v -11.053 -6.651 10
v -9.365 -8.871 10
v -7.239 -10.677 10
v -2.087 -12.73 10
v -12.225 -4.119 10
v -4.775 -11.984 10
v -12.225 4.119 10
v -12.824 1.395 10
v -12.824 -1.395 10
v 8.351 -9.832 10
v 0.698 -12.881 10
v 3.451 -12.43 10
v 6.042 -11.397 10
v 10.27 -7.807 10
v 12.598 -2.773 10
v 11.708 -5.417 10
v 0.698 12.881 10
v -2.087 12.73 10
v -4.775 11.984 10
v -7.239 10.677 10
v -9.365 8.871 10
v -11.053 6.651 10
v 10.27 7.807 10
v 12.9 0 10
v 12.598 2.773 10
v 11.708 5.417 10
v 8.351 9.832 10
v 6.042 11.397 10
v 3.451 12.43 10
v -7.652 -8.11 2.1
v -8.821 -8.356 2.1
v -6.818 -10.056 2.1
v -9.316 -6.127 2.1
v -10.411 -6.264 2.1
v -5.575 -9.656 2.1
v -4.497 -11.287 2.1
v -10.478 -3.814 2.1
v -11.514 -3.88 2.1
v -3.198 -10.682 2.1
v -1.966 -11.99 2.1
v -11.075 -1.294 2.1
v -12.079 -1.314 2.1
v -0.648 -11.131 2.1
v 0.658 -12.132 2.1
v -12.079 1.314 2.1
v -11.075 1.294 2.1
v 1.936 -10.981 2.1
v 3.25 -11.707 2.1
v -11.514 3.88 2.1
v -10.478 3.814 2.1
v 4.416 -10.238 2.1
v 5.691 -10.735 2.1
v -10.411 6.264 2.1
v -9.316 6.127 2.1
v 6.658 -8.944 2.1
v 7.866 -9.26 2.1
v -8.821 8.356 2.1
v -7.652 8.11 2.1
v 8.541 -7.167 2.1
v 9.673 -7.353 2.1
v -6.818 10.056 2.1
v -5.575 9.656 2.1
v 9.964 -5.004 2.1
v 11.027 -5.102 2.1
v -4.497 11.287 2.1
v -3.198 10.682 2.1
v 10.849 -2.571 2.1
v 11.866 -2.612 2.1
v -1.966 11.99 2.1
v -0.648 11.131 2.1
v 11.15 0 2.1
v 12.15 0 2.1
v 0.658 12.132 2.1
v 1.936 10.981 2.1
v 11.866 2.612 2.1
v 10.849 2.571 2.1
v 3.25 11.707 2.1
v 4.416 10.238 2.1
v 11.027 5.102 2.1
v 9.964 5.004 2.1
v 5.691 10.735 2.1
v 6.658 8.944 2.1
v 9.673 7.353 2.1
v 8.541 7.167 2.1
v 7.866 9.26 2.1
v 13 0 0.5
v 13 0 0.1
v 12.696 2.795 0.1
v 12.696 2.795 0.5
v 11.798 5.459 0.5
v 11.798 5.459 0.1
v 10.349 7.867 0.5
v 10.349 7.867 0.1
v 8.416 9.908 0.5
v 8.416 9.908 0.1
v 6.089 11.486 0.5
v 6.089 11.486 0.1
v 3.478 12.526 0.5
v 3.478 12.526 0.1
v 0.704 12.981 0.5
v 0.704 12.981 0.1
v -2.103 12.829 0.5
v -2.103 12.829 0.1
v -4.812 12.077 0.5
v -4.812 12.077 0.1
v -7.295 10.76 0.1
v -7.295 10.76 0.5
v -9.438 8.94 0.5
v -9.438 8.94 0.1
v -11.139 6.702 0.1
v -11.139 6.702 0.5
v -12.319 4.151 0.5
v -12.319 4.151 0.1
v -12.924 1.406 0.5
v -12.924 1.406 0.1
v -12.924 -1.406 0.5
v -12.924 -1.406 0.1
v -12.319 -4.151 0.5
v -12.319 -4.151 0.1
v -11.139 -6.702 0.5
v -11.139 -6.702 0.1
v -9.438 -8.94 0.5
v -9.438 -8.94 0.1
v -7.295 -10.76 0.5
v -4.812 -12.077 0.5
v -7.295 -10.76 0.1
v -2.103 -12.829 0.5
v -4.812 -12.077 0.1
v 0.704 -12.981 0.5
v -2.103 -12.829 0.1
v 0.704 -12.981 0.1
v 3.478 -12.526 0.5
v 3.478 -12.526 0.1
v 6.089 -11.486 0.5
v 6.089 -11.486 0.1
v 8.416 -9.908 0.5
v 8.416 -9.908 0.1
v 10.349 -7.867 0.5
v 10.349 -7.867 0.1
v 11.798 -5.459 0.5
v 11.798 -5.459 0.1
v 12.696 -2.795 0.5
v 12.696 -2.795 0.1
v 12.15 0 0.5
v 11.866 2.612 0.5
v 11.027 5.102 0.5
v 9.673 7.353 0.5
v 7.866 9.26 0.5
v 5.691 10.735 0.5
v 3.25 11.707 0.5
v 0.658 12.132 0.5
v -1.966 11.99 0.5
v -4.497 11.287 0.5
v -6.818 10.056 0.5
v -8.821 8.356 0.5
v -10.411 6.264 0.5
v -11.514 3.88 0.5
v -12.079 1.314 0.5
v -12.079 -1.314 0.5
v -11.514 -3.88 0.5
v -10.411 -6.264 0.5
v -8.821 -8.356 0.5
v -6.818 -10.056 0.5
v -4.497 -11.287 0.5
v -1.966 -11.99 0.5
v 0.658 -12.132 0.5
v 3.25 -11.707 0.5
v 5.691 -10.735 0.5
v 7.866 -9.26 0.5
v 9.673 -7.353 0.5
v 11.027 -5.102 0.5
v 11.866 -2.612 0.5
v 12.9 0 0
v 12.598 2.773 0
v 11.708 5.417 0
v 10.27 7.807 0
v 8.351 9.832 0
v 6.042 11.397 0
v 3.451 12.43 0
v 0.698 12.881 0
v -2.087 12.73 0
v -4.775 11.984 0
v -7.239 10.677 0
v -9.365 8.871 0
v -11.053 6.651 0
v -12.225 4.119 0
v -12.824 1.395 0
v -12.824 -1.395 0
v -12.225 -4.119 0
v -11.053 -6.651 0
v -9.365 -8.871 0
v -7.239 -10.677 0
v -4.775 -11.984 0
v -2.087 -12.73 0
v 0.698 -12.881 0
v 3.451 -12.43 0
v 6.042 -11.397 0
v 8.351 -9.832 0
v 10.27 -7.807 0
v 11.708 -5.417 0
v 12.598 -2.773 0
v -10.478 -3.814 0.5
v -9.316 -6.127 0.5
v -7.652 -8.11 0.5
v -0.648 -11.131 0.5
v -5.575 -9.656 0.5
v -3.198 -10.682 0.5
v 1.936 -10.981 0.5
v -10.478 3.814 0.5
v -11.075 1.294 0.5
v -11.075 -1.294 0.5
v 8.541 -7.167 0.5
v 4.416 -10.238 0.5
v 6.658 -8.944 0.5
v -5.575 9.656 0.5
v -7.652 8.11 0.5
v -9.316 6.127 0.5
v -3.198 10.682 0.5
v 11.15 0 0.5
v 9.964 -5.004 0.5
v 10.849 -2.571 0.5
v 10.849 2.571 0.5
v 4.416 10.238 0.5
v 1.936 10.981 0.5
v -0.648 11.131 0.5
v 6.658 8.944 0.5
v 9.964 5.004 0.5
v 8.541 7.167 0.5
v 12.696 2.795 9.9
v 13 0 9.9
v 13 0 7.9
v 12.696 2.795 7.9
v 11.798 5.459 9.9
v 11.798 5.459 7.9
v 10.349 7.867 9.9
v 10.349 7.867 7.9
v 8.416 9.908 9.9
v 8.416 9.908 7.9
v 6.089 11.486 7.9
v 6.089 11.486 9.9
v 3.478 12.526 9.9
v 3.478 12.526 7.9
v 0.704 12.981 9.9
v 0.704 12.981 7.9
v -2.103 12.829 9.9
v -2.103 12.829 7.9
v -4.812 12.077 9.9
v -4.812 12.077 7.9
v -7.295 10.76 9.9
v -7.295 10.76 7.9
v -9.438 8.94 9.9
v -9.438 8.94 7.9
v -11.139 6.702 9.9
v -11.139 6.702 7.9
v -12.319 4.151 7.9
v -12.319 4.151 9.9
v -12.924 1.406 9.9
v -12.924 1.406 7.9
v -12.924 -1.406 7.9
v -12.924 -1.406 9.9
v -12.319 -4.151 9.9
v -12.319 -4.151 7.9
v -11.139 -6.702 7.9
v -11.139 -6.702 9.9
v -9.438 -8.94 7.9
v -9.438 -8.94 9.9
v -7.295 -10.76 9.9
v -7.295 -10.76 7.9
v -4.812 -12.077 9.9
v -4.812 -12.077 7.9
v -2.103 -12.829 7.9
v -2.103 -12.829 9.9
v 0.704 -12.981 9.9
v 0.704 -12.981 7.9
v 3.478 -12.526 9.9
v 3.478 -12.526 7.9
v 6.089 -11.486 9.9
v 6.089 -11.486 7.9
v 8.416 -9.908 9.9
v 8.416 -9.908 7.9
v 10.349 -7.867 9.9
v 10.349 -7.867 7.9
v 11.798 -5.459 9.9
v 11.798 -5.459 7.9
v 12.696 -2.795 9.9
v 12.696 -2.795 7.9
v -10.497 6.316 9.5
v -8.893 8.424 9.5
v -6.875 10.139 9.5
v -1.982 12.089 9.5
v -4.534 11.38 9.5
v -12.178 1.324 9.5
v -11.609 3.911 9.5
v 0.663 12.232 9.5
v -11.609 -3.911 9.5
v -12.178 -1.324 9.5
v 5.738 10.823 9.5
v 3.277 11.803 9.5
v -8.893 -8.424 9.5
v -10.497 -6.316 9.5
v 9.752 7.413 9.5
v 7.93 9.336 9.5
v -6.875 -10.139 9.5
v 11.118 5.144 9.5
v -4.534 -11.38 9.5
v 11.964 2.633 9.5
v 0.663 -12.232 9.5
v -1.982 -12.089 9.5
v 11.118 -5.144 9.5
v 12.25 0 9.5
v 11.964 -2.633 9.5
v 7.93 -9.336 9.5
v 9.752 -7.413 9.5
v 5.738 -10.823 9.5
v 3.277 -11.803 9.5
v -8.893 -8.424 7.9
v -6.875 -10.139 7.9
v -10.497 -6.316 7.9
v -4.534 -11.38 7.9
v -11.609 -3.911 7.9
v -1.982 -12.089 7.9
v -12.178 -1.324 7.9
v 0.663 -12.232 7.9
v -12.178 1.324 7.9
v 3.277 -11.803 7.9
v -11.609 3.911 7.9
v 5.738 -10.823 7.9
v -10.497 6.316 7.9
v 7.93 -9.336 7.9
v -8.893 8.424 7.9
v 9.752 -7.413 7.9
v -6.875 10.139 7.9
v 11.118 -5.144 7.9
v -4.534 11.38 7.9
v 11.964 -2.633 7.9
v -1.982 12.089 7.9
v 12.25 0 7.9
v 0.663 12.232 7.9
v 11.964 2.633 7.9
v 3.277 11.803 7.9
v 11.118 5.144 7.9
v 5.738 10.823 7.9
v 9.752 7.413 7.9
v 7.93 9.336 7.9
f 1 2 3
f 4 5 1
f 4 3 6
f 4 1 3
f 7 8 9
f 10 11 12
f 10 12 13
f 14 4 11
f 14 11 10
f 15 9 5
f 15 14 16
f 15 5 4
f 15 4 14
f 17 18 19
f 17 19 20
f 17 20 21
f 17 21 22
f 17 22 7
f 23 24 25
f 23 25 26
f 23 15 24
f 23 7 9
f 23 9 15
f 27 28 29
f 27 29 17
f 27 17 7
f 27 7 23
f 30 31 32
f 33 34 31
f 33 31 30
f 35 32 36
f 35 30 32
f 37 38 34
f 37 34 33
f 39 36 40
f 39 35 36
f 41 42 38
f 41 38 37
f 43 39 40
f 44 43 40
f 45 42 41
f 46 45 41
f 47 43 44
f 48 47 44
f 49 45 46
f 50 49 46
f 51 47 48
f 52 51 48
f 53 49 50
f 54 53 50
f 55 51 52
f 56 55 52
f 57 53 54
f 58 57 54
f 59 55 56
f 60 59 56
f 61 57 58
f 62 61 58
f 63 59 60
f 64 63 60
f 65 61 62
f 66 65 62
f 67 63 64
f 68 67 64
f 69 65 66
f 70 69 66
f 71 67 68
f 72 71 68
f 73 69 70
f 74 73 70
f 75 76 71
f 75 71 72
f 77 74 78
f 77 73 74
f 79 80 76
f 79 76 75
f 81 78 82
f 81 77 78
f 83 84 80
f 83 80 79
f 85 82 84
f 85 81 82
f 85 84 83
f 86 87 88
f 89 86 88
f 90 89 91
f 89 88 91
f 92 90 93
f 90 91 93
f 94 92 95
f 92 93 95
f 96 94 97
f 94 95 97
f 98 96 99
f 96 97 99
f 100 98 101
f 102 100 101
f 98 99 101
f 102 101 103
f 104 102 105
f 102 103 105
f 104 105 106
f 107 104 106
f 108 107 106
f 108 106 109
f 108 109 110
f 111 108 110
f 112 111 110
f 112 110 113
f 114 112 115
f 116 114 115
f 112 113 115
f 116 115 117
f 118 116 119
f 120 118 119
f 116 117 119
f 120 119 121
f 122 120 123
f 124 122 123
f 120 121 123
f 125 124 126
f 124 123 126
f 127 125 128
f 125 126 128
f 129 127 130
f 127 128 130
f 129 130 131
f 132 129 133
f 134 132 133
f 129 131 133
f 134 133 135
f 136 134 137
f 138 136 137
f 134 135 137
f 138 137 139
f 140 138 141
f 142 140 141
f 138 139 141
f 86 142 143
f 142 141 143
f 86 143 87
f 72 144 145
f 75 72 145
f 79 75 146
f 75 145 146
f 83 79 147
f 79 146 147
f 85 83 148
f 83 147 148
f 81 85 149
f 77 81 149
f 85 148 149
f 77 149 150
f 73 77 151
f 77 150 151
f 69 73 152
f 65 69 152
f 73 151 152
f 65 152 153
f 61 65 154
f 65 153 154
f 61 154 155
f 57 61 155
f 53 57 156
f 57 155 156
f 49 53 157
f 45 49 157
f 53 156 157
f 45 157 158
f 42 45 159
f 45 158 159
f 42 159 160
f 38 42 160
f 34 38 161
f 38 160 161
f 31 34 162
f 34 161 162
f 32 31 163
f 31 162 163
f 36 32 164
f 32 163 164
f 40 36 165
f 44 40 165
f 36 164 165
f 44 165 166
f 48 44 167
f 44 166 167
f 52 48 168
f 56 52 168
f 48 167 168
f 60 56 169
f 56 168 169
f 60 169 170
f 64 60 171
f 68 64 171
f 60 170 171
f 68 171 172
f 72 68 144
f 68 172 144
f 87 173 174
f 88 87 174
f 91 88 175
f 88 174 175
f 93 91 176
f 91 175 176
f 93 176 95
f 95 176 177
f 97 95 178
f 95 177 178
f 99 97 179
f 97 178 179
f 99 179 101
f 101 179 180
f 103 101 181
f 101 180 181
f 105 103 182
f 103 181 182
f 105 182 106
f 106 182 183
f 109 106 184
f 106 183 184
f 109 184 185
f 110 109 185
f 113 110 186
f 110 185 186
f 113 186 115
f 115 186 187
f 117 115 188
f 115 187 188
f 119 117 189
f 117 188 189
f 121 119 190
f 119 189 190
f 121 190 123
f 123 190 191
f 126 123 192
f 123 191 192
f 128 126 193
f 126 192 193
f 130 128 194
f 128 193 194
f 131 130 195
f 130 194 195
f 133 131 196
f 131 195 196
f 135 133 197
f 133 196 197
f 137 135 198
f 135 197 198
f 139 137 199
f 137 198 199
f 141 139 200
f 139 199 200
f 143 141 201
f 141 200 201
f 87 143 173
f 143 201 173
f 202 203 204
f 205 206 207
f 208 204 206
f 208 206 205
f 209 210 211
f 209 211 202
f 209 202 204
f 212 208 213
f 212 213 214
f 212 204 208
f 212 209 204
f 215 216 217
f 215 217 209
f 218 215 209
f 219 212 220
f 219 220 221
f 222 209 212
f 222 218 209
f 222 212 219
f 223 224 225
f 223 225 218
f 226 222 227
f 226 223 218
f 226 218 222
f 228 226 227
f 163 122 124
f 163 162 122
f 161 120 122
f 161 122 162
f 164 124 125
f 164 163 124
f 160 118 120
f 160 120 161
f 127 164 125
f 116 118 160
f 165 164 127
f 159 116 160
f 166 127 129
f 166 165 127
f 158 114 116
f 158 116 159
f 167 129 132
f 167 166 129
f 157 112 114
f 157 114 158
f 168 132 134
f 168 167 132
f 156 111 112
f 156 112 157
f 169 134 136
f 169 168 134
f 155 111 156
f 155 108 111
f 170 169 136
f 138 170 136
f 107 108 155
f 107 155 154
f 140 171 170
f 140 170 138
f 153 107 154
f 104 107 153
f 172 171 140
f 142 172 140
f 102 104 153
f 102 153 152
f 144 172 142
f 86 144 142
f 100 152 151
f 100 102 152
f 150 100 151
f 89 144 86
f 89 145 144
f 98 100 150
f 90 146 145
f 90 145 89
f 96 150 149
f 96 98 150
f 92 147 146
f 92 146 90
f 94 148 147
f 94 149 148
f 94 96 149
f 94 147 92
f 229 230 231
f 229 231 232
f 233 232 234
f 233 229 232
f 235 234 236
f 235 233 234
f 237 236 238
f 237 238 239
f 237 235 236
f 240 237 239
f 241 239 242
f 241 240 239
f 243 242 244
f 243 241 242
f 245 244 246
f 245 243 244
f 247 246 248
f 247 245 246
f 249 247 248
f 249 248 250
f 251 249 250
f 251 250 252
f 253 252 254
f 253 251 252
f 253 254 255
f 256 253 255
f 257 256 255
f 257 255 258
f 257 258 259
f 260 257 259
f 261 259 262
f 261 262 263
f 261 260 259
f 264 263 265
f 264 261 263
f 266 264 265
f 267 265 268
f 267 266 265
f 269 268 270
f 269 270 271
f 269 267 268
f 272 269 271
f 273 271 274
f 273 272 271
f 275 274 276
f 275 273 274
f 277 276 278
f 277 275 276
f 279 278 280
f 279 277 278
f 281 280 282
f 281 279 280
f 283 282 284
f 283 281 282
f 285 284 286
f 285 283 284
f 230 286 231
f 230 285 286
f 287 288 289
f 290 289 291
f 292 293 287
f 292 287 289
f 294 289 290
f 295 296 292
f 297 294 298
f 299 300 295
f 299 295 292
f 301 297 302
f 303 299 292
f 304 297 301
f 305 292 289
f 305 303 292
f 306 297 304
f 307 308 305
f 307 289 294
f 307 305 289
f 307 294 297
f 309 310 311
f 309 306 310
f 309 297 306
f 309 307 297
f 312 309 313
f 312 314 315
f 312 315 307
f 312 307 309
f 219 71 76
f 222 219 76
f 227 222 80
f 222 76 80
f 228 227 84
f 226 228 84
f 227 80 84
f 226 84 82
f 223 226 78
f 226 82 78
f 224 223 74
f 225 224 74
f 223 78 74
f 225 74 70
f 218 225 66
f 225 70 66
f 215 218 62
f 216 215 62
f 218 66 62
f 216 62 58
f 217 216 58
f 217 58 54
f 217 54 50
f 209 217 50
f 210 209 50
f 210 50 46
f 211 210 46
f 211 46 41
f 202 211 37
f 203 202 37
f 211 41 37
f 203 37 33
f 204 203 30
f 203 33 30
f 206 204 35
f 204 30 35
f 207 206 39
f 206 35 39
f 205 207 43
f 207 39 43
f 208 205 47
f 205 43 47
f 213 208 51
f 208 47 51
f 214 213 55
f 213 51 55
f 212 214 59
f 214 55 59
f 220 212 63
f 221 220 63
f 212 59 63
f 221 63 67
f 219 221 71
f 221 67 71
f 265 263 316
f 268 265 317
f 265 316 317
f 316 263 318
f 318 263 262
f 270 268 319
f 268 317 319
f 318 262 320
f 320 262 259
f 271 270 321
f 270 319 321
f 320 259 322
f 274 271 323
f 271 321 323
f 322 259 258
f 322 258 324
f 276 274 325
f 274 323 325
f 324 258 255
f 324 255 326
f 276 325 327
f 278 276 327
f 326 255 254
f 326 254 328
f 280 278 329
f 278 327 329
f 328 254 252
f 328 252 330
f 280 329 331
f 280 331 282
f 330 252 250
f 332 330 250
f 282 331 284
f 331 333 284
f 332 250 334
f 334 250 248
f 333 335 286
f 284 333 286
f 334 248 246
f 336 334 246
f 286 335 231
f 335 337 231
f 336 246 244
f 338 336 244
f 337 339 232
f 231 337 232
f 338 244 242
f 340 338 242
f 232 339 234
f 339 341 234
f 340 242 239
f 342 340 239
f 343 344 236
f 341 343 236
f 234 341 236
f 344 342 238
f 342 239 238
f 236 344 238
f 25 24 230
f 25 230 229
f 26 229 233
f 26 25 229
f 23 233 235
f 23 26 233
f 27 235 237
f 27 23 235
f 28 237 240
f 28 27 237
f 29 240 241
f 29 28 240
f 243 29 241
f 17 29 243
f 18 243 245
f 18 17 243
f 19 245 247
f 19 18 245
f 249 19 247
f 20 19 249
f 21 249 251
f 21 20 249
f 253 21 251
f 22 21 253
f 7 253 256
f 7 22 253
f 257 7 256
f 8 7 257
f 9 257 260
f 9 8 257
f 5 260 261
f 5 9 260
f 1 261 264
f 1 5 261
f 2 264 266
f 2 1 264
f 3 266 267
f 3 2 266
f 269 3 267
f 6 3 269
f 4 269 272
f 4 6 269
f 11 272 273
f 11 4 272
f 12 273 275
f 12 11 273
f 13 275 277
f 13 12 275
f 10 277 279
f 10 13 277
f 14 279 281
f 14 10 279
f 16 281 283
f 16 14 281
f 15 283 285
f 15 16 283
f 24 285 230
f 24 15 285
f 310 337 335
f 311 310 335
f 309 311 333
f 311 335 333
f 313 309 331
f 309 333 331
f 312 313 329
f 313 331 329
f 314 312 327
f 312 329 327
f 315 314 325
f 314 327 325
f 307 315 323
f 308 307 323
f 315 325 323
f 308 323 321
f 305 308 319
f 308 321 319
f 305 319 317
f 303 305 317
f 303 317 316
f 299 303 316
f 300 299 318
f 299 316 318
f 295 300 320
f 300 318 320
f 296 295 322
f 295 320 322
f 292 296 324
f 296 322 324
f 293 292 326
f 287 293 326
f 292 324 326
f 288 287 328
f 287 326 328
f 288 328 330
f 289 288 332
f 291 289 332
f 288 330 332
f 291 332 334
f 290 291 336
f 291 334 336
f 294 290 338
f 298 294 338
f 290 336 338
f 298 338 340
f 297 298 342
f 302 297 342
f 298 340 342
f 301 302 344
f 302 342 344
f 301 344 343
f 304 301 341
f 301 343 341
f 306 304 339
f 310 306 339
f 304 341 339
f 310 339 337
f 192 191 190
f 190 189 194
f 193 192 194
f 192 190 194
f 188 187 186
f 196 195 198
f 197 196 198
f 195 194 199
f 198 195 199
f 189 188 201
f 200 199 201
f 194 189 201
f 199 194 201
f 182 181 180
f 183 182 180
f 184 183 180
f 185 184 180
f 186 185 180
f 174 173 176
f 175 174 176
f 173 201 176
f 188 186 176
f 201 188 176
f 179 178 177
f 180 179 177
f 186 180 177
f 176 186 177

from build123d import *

# Parameters (mm, degrees)
F0_R       = 13
F1_DEPTH   = 0.5
F2_R       = 12.15
F3_DEPTH   = 1.6
F4_R       = 11.15
F5_DEPTH   = 1.6
F7_R       = 13
F8_DEPTH   = 2.1
F9_R       = 12.25
F10_DEPTH  = 1.6
F11_SIZE   = 0.1
F11_2_SIZE = 0.1


with BuildPart() as f1:
    # F0 (on Top) → F1 (new body)
    with BuildSketch(Plane.XY):
        Circle(F0_R)
    extrude(amount=F1_DEPTH)

    # F2 (on face) → F3 (join)
    with BuildSketch(Plane.XY.offset(0.5)):
        Circle(F2_R)
    extrude(amount=F3_DEPTH)

    # F4 (on face) → F5 (cut)
    with BuildSketch(Plane.XY.offset(2.1)):
        Circle(F4_R)
    extrude(amount=-F5_DEPTH, mode=Mode.SUBTRACT)

    # F11#2
    f11_2_edges = [f1.edges().sort_by_distance(p)[0] for p in [
        (-13, 0, 0),
    ]]
    chamfer(f11_2_edges, length=F11_2_SIZE)


with BuildPart() as f8:
    # F7 (on offset) → F8 (new body)
    with BuildSketch(Plane.XY.offset(10)):
        Circle(F7_R)
    extrude(amount=-F8_DEPTH)

    # F9 (on face) → F10 (cut)
    with BuildSketch(Plane(origin=(0, 0, 7.9), x_dir=(1, 0, 0), z_dir=(0, 0, -1))):
        Circle(F9_R)
    extrude(amount=-F10_DEPTH, mode=Mode.SUBTRACT)

    # F11
    f11_edges = [f8.edges().sort_by_distance(p)[0] for p in [
        (-13, 0, 10),
    ]]
    chamfer(f11_edges, length=F11_SIZE)


solid = Compound([f1.part, f8.part])
